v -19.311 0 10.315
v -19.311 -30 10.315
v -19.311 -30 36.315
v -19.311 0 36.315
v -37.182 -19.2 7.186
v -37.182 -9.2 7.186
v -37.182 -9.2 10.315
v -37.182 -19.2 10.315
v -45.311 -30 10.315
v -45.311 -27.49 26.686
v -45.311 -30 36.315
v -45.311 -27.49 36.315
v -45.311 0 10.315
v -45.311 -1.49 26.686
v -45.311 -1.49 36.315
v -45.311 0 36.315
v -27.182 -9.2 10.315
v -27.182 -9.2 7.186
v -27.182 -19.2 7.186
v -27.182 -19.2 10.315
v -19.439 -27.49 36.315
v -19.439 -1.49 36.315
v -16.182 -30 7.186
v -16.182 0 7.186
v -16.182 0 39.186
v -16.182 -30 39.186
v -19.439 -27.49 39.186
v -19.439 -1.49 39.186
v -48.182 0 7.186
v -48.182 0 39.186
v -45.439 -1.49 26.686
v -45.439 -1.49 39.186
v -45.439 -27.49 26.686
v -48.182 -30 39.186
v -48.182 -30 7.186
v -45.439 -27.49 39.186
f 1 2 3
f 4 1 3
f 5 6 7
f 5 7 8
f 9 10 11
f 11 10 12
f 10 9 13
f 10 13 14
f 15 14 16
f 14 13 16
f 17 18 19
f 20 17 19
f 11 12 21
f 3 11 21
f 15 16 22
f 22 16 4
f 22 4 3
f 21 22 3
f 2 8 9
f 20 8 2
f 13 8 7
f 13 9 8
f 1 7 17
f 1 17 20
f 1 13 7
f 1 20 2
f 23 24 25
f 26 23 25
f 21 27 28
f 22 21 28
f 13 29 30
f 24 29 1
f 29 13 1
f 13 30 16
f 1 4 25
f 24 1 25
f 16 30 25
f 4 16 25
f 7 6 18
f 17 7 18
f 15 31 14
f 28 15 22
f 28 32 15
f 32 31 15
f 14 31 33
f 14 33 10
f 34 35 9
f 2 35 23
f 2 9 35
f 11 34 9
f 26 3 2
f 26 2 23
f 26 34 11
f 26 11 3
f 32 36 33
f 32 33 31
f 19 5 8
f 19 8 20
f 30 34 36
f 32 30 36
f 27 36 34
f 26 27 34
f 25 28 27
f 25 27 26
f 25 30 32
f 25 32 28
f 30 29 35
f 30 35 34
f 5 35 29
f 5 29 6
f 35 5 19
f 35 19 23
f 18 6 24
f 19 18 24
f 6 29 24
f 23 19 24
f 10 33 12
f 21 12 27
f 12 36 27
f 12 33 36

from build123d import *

# Parameters (mm, degrees)
F0_W     = 32
F0_H     = 32
F1_DEPTH = 30
F2_W     = 26
F2_H     = 26
F3_DEPTH = 30.001
F4_W     = 26
F4_H     = 26
F5_DEPTH = 12.5
F6_W     = 10
F6_H     = 10
F7_DEPTH = 32.001


# Not quite as in the source:
# - a feature names something its author has since deleted; it is built from what else it names


with BuildPart() as f1:
    # F0 (on Front) → F1 (new body)
    with BuildSketch(Plane.XZ):
        with Locations((-32.1818544654, 23.1859142184)):
            Rectangle(F0_W, F0_H)
    extrude(amount=F1_DEPTH)

    # F2 (on Front) → F3 (cut, through all)
    with BuildSketch(Plane.XZ):
        with Locations((-32.3113440342, 23.315487102)):
            Rectangle(F2_W, F2_H)
    extrude(amount=F3_DEPTH, mode=Mode.SUBTRACT)

    # F4 (on face) → F5 (cut, symmetric)
    with BuildSketch(Plane.XY.offset(39.1859142184)):
        with Locations((-32.4389154911, -14.4897329509)):
            Rectangle(F4_W, F4_H)
    extrude(amount=F5_DEPTH, both=True, mode=Mode.SUBTRACT)

    # F6 (on face) → F7 (cut, through all)
    with BuildSketch(Plane(origin=(0, 0, 7.1859142184), x_dir=(1, 0, 0), z_dir=(0, 0, -1))):
        with Locations((-32.1818544654, 14.1996787861)):
            Rectangle(F6_W, F6_H)
    extrude(amount=-F7_DEPTH, mode=Mode.SUBTRACT)


solid = f1.part
